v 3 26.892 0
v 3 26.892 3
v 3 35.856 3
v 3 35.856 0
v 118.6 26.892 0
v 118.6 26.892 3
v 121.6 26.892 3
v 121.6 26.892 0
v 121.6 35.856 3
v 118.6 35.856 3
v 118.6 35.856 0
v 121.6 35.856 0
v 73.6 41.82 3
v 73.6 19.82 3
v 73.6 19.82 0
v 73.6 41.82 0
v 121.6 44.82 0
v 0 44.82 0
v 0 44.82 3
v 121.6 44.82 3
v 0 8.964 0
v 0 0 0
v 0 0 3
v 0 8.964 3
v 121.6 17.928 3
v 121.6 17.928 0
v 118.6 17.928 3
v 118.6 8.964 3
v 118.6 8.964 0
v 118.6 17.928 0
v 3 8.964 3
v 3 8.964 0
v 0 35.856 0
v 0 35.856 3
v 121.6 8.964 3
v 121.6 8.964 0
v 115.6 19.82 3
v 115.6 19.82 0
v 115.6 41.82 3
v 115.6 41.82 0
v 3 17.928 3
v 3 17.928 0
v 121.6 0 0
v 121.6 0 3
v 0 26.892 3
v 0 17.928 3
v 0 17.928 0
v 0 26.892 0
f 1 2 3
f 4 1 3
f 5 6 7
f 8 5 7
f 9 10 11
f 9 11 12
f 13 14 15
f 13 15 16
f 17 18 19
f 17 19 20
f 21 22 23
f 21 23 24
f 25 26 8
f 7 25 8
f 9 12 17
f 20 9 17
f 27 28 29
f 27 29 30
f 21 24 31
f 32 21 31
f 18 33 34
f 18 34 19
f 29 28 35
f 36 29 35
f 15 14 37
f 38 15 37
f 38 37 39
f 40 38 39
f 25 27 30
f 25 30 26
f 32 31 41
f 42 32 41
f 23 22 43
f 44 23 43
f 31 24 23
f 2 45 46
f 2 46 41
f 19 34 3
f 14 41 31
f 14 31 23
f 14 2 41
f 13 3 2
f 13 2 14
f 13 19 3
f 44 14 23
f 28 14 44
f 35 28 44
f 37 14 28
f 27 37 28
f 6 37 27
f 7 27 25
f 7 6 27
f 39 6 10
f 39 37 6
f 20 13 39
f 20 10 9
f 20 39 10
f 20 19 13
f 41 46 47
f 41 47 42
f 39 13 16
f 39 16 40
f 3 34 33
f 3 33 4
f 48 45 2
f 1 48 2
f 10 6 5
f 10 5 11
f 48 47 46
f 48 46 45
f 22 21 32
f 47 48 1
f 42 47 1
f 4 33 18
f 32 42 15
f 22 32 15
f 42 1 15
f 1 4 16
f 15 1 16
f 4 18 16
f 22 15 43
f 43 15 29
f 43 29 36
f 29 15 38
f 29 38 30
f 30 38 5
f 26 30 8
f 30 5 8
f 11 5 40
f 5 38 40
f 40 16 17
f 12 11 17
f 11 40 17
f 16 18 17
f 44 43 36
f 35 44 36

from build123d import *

# Parameters (mm, degrees)
SKETCH1_W           = 121.6
SKETCH1_H           = 44.82
BOSS_EXTRUDE1_DEPTH = 3
CUT_EXTRUDE1_REACH  = 5
SKETCH4_W           = 42
SKETCH4_H           = 22
SKETCH5_W           = 3
SKETCH5_H           = 8.964
CUT_EXTRUDE2_DEPTH  = 4


with BuildPart() as part:
    # Sketch1 → Boss-Extrude1 (new body)
    with BuildSketch(Plane.XY):
        with Locations((60.8, 22.41)):
            Rectangle(SKETCH1_W, SKETCH1_H)
    extrude(amount=BOSS_EXTRUDE1_DEPTH)

    # Sketch4 → Cut-Extrude1 (cut, up to next)
    with BuildSketch(Plane.XY.offset(3), mode=Mode.PRIVATE) as cut_extrude1_sk1:
        with Locations((94.6, 30.82)):
            Rectangle(SKETCH4_W, SKETCH4_H)
    cut_extrude1_tool1 = extrude(cut_extrude1_sk1.sketch, amount=-CUT_EXTRUDE1_REACH, mode=Mode.PRIVATE) & part.part
    add(cut_extrude1_tool1.solids().sort_by_distance((94.6, 30.82, 3))[0], mode=Mode.SUBTRACT)

    # Sketch5 → Cut-Extrude2 (cut, through all)
    with BuildSketch(Plane.XY.offset(3)):
        with Locations((1.5, 13.446)):
            Rectangle(SKETCH5_W, SKETCH5_H)
        with Locations((1.5, 31.374)):
            Rectangle(SKETCH5_W, SKETCH5_H)
        with Locations((120.1, 13.446)):
            Rectangle(SKETCH5_W, SKETCH5_H)
        with Locations((120.1, 31.374)):
            Rectangle(SKETCH5_W, SKETCH5_H)
    extrude(amount=-CUT_EXTRUDE2_DEPTH, mode=Mode.SUBTRACT)


solid = part.part
